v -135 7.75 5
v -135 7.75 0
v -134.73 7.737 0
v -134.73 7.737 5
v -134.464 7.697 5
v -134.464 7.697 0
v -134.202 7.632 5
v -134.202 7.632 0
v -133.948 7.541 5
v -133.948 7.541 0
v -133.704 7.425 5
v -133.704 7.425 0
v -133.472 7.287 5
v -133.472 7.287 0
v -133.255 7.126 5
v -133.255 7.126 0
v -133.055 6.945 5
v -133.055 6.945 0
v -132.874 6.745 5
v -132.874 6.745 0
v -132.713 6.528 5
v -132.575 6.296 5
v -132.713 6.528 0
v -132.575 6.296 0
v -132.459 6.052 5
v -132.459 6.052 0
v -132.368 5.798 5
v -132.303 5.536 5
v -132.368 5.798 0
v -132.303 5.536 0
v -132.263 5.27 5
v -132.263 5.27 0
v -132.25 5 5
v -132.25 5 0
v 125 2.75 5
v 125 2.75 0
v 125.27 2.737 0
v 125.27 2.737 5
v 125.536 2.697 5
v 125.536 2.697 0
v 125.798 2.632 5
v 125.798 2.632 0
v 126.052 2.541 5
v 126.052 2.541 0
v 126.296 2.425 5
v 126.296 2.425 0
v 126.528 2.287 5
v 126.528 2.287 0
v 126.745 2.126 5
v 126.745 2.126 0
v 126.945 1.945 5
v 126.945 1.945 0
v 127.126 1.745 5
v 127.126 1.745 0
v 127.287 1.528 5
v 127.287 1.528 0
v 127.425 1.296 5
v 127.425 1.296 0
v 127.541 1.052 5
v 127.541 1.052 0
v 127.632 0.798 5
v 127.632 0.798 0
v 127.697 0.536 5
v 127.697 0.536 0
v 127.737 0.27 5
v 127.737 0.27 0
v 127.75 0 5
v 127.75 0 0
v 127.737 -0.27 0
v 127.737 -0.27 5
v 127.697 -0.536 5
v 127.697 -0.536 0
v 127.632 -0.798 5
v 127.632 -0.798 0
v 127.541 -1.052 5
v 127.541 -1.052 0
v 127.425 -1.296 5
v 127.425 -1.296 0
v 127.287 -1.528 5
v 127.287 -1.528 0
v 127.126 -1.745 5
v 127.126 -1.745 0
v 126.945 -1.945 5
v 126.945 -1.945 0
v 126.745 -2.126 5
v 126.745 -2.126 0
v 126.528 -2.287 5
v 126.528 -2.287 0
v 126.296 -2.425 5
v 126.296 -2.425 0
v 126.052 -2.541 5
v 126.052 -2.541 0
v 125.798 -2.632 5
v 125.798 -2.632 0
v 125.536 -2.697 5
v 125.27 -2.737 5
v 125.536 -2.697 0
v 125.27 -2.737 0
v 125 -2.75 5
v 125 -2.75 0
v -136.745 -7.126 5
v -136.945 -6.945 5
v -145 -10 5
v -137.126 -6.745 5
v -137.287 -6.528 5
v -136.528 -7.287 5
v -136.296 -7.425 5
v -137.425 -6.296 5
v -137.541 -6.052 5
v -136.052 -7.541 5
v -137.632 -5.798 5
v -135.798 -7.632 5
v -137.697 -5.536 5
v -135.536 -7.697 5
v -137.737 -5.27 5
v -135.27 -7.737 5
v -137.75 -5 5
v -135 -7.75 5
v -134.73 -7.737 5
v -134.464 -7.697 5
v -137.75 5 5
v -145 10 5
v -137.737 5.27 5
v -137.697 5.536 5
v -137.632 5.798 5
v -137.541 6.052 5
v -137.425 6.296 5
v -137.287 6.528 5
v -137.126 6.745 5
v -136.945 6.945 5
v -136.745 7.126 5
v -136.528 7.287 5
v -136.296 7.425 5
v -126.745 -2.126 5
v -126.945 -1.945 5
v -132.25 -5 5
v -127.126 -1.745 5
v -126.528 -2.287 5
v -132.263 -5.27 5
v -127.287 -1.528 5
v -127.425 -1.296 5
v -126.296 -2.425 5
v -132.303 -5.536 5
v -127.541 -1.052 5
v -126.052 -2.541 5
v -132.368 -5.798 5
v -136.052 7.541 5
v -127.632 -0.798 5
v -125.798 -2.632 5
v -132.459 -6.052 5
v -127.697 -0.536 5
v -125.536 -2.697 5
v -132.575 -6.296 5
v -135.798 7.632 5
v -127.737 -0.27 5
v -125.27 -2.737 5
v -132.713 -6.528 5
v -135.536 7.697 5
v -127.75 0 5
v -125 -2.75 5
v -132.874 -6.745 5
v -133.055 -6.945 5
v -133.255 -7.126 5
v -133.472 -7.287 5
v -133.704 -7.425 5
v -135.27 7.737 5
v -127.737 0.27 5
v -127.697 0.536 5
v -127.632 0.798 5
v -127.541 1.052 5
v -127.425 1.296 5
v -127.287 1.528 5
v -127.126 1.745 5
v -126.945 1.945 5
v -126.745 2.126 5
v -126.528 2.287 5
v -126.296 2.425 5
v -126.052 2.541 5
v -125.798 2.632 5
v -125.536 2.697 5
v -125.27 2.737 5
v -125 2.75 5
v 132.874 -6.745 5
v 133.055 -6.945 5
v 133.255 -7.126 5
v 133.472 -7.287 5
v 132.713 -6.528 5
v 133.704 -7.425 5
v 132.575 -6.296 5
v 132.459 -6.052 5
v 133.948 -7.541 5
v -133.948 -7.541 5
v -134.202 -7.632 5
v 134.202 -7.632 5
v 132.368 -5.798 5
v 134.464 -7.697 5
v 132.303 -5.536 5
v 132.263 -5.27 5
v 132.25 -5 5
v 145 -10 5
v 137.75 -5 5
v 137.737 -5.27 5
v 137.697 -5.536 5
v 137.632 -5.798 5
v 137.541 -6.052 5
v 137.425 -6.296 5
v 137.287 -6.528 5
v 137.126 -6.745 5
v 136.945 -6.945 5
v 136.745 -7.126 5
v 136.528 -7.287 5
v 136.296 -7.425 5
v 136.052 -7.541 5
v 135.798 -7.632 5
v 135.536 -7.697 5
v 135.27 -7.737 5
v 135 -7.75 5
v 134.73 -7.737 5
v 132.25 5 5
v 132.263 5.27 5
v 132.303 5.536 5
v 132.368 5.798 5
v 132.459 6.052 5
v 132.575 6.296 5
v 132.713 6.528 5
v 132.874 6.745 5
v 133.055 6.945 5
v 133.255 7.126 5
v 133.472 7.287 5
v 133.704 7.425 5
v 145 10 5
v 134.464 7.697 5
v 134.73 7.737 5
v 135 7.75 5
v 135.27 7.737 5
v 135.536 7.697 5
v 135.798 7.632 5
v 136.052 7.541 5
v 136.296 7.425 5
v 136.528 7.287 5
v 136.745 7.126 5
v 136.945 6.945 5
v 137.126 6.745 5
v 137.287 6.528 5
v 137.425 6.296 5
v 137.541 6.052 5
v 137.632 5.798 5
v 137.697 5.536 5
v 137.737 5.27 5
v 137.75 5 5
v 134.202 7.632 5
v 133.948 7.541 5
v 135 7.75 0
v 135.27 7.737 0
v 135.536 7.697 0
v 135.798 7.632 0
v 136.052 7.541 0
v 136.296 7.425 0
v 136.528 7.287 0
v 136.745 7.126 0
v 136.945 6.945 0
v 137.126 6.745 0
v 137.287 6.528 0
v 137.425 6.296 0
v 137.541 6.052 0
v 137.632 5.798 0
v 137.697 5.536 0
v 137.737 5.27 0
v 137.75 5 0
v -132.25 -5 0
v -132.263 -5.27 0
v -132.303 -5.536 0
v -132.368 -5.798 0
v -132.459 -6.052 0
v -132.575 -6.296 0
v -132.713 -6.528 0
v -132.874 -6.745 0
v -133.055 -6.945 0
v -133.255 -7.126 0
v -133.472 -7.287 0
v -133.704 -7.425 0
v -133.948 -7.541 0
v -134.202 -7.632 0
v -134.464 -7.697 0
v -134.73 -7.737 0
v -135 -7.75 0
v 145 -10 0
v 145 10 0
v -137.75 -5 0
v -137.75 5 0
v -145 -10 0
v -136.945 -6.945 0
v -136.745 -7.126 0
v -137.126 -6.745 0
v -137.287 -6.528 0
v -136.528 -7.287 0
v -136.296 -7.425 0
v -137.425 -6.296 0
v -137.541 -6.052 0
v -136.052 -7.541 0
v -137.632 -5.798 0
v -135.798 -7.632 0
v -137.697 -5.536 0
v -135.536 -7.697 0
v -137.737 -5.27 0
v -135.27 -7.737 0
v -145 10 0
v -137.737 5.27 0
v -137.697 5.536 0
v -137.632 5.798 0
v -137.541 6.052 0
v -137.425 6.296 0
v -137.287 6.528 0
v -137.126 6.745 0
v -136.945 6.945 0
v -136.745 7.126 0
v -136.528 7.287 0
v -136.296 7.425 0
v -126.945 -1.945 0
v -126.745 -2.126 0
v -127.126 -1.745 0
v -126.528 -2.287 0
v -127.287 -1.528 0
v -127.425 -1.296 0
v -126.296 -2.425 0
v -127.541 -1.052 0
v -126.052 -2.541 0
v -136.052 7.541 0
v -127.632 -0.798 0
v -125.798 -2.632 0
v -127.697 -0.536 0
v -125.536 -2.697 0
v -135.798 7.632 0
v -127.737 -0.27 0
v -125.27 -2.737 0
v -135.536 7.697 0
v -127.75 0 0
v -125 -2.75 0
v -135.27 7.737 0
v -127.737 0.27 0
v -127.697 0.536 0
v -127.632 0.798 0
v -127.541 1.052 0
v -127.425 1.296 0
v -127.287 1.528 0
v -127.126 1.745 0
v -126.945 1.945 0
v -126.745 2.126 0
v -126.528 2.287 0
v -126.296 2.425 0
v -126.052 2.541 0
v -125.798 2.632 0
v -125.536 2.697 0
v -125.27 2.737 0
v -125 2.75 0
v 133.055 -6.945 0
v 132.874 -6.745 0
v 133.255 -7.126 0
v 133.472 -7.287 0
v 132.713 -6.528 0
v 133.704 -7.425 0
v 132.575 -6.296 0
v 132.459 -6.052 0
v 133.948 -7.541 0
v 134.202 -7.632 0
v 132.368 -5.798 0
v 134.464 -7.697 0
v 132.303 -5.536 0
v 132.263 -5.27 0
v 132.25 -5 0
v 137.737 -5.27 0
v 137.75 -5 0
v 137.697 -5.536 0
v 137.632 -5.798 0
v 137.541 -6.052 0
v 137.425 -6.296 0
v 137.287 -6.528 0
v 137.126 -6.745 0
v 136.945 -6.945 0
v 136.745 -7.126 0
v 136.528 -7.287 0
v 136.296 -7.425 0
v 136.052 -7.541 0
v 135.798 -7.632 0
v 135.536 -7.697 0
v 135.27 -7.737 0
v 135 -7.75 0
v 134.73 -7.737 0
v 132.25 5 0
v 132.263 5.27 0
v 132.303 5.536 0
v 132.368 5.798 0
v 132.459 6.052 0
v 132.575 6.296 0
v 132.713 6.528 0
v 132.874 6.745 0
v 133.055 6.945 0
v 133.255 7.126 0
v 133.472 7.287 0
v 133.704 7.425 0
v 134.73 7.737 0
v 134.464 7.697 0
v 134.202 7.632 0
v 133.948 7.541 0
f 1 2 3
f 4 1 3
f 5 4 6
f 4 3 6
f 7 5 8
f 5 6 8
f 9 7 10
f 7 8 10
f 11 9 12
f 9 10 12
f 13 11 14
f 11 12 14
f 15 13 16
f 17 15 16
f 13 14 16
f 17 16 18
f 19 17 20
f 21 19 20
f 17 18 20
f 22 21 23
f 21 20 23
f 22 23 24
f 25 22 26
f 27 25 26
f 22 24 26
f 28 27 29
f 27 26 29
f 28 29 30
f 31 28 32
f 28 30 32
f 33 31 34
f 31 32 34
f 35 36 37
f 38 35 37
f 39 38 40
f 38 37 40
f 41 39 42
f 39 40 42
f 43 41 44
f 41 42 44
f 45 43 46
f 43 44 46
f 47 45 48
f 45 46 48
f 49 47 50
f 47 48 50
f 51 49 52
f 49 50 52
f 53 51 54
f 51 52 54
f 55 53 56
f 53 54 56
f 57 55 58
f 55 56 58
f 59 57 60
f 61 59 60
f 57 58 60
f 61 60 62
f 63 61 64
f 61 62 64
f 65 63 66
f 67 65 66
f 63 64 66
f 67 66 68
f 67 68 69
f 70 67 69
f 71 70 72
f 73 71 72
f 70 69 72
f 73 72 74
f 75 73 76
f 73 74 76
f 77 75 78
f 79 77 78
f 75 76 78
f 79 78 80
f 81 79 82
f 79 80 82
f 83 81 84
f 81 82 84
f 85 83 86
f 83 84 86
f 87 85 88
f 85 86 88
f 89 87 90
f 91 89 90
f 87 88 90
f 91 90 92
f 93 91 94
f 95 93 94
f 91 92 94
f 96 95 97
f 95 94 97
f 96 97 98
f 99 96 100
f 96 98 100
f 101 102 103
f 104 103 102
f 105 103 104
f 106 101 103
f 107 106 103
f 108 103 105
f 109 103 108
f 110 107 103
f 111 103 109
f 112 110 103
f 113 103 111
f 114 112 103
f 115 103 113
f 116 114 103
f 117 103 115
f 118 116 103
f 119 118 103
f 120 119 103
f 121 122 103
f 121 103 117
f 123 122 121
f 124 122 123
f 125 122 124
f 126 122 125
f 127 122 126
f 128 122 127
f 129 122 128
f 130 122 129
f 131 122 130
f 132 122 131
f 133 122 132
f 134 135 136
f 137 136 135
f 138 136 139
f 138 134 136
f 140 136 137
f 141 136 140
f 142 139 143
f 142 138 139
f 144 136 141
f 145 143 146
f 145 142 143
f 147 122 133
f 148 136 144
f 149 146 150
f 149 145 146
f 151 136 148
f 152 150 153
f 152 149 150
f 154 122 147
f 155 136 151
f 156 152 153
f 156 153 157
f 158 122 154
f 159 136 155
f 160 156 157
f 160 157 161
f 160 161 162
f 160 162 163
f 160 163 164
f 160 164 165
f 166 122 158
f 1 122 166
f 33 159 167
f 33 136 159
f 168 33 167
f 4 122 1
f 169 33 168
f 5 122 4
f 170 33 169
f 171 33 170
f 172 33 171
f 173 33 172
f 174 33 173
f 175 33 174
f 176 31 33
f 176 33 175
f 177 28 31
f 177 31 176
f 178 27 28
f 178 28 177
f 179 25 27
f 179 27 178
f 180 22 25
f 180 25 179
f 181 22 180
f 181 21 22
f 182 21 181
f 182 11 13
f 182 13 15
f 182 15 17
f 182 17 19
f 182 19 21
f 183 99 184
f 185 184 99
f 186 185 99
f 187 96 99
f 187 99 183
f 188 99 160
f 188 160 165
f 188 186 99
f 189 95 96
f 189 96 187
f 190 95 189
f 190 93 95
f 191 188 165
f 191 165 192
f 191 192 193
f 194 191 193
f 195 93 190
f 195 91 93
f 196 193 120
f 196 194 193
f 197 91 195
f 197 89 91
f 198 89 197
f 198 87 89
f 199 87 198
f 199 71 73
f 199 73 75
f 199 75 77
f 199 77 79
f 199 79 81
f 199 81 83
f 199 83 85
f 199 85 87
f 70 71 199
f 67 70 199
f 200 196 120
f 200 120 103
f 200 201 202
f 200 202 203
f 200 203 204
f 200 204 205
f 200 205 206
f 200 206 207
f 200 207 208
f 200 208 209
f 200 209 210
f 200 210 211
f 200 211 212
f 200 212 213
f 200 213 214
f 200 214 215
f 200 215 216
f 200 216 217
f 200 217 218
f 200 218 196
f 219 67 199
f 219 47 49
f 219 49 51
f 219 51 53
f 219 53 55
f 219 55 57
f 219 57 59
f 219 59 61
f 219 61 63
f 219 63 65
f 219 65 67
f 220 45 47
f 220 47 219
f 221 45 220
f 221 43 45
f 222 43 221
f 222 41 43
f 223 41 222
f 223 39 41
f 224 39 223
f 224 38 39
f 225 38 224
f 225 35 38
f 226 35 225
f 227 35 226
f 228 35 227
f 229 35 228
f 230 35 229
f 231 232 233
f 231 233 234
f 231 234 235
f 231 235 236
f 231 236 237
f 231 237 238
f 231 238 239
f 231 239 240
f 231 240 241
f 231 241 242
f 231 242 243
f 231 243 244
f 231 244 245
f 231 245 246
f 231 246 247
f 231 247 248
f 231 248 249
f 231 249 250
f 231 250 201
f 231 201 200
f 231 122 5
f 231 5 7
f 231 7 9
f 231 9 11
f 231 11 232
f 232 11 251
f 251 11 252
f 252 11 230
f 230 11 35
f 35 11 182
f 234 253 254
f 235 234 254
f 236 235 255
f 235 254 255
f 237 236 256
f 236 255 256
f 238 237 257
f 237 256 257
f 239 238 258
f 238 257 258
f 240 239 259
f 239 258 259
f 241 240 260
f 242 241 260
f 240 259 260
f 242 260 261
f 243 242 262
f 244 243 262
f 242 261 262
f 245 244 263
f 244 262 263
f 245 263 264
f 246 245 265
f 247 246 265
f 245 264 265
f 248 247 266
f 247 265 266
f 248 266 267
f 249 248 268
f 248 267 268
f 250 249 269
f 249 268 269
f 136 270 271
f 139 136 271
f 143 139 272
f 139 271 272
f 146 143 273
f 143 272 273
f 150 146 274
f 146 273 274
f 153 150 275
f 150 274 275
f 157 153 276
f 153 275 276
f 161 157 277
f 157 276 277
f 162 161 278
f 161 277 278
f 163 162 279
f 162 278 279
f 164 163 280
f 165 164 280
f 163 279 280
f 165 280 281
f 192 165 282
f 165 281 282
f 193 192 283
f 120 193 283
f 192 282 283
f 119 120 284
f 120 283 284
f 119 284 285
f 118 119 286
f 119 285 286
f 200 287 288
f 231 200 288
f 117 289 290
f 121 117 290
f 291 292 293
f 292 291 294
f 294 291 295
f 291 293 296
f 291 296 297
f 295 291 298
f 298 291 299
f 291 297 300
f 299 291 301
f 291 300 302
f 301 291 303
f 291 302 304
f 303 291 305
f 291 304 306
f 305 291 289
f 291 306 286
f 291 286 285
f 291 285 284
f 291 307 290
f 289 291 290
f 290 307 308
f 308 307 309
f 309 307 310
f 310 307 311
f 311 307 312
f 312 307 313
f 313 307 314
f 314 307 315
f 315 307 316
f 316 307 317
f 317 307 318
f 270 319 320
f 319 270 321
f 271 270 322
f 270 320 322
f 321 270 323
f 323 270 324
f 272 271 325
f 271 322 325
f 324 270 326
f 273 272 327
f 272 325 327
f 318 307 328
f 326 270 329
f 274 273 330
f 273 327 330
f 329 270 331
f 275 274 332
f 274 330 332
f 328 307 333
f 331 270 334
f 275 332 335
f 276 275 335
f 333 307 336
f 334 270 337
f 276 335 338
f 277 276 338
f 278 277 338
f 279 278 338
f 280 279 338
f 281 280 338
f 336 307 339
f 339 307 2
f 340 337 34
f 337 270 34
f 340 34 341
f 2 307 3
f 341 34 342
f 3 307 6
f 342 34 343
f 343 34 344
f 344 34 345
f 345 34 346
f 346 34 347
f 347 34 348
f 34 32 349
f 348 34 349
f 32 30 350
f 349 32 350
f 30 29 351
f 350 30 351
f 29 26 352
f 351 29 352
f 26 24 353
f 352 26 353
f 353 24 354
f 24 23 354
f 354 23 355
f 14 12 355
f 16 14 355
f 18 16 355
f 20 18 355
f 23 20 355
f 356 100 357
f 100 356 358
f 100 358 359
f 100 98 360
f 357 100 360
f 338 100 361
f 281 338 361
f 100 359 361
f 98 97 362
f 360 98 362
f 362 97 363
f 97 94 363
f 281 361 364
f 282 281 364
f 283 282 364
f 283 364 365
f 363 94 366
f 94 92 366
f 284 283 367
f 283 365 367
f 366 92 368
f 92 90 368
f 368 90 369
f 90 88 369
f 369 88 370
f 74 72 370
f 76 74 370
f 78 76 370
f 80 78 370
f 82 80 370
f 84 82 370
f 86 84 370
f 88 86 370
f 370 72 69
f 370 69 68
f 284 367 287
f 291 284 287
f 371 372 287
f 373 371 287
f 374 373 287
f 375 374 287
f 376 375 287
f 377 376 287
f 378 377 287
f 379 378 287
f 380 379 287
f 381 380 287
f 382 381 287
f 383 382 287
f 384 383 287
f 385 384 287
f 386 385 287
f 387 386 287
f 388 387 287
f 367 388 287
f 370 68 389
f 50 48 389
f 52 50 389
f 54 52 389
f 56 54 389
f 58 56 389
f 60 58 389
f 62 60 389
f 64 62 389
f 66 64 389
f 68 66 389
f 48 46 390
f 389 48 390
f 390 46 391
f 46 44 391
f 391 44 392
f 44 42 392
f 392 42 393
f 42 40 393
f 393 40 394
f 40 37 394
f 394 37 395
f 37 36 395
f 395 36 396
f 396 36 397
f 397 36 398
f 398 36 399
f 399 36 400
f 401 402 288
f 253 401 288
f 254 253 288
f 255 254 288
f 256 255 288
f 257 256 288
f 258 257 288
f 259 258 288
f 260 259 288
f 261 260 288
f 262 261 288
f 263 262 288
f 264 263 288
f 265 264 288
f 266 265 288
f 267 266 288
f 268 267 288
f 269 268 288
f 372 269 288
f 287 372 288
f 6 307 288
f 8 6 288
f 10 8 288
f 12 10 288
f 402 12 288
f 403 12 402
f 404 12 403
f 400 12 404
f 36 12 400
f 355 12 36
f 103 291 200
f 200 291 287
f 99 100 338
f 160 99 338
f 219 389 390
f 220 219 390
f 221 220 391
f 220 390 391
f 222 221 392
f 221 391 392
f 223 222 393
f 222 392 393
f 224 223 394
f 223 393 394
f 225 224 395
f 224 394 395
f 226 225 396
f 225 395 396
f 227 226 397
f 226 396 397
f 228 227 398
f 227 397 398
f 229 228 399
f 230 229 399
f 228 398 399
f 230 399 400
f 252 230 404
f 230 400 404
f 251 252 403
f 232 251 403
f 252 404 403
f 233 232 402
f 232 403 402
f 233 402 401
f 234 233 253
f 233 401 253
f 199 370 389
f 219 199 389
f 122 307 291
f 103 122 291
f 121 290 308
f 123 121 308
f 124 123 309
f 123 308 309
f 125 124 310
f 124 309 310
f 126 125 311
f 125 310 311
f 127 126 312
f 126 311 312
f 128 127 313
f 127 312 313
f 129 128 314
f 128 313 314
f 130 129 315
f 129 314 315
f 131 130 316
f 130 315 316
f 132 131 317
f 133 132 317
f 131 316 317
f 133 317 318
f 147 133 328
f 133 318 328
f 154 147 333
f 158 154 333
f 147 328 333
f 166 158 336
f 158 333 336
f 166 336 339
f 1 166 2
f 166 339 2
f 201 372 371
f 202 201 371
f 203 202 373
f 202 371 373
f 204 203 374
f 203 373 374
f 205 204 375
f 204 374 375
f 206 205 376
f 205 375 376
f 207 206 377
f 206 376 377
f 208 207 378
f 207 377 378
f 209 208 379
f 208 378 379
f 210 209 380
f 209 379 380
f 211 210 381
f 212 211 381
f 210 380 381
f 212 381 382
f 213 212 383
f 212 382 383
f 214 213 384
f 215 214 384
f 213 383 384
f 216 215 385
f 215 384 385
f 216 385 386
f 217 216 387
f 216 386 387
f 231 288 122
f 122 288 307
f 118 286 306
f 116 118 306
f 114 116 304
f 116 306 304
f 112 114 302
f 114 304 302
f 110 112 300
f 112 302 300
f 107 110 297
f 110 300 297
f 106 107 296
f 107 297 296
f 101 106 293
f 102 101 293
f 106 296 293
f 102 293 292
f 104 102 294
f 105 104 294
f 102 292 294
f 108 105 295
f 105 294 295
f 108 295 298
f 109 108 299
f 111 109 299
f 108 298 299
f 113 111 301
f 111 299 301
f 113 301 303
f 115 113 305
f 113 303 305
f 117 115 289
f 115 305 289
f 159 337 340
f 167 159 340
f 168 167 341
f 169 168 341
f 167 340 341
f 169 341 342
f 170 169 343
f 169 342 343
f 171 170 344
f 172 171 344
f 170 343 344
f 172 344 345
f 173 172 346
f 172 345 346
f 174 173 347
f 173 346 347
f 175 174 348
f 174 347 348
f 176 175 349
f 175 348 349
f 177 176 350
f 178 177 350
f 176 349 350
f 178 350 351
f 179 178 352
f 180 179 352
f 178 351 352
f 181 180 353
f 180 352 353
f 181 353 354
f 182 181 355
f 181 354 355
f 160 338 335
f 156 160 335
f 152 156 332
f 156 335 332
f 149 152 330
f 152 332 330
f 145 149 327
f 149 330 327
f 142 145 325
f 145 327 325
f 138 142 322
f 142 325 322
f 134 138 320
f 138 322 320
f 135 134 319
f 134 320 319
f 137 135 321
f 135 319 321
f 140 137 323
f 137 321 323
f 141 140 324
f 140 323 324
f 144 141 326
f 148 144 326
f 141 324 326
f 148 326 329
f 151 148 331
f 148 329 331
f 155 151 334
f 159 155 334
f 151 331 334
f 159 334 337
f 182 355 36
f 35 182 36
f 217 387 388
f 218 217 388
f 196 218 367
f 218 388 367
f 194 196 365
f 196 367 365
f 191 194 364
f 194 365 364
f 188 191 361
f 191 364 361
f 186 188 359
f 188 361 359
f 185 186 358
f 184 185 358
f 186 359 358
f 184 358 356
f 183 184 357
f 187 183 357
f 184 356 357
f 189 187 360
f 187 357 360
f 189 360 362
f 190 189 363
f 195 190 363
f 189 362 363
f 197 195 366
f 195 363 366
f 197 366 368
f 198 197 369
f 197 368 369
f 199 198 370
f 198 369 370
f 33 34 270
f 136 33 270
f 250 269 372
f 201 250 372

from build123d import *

# Parameters (mm, degrees)
EXTRUDE_1_DEPTH     = 5
CUT_EXTRUDE_1_DEPTH = 5


with BuildPart() as part:
    # 草图1 → 凸台-拉伸1 (new body)
    with BuildSketch(Plane.XY):
        Polygon((145, 10), (0, 10), (-145, 10), (-145, -10), (145, -10), align=None)
    extrude(amount=EXTRUDE_1_DEPTH)

    # 草图3 → 切除-拉伸1 (cut)
    with BuildSketch(Plane(origin=(0, 0, 0), x_dir=(-1, 0, 0), z_dir=(0, 0, -1))):
        with BuildLine():
            Line((-135, 5), (-135, 0))
            Line((-135, 0), (-132.25, 0))
            Line((-132.25, 0), (-132.25, 5))
            ThreePointArc((-132.25, 5), (-133.055456352, 6.944543648), (-135, 7.75))
            Line((-135, 7.75), (-135, 5))
        make_face()
        with BuildLine():
            Line((-137.75, 5), (-137.75, 0))
            Line((-137.75, 0), (-135, 0))
            Line((-135, 0), (-135, 5))
            Line((-135, 5), (-135, 7.75))
            ThreePointArc((-135, 7.75), (-136.944543648, 6.944543648), (-137.75, 5))
        make_face()
        with BuildLine():
            Line((-135, 0), (-137.75, 0))
            Line((-137.75, 0), (-137.75, -5))
            ThreePointArc((-137.75, -5), (-136.944543648, -6.944543648), (-135, -7.75))
            Line((-135, -7.75), (-135, -5))
            Line((-135, -5), (-135, 0))
        make_face()
        with BuildLine():
            Line((-132.25, 0), (-135, 0))
            Line((-135, 0), (-135, -5))
            Line((-135, -5), (-135, -7.75))
            ThreePointArc((-135, -7.75), (-133.055456352, -6.944543648), (-132.25, -5))
            Line((-132.25, -5), (-132.25, 0))
        make_face()
        with BuildLine():
            Line((-125, 0), (-127.75, 0))
            ThreePointArc((-127.75, 0), (-126.944543648, -1.944543648), (-125, -2.75))
            Line((-125, -2.75), (125, -2.75))
            ThreePointArc((125, -2.75), (126.944543648, -1.944543648), (127.75, 0))
            Line((127.75, 0), (125, 0))
            Line((125, 0), (-125, 0))
        make_face()
        with BuildLine():
            ThreePointArc((-125, 2.75), (-126.944543648, 1.944543648), (-127.75, 0))
            Line((-127.75, 0), (-125, 0))
            Line((-125, 0), (125, 0))
            Line((125, 0), (127.75, 0))
            ThreePointArc((127.75, 0), (126.944543648, 1.944543648), (125, 2.75))
            Line((125, 2.75), (-125, 2.75))
        make_face()
        with BuildLine():
            Line((135, 5), (135, 0))
            Line((135, 0), (137.75, 0))
            Line((137.75, 0), (137.75, 5))
            ThreePointArc((137.75, 5), (136.944543648, 6.944543648), (135, 7.75))
            Line((135, 7.75), (135, 5))
        make_face()
        with BuildLine():
            Line((132.25, 5), (132.25, 0))
            Line((132.25, 0), (135, 0))
            Line((135, 0), (135, 5))
            Line((135, 5), (135, 7.75))
            ThreePointArc((135, 7.75), (133.055456352, 6.944543648), (132.25, 5))
        make_face()
        with BuildLine():
            Line((135, 0), (132.25, 0))
            Line((132.25, 0), (132.25, -5))
            ThreePointArc((132.25, -5), (133.055456352, -6.944543648), (135, -7.75))
            Line((135, -7.75), (135, -5))
            Line((135, -5), (135, 0))
        make_face()
        with BuildLine():
            Line((137.75, 0), (135, 0))
            Line((135, 0), (135, -5))
            Line((135, -5), (135, -7.75))
            ThreePointArc((135, -7.75), (136.944543648, -6.944543648), (137.75, -5))
            Line((137.75, -5), (137.75, 0))
        make_face()
    extrude(amount=-CUT_EXTRUDE_1_DEPTH, mode=Mode.SUBTRACT)


solid = part.part
